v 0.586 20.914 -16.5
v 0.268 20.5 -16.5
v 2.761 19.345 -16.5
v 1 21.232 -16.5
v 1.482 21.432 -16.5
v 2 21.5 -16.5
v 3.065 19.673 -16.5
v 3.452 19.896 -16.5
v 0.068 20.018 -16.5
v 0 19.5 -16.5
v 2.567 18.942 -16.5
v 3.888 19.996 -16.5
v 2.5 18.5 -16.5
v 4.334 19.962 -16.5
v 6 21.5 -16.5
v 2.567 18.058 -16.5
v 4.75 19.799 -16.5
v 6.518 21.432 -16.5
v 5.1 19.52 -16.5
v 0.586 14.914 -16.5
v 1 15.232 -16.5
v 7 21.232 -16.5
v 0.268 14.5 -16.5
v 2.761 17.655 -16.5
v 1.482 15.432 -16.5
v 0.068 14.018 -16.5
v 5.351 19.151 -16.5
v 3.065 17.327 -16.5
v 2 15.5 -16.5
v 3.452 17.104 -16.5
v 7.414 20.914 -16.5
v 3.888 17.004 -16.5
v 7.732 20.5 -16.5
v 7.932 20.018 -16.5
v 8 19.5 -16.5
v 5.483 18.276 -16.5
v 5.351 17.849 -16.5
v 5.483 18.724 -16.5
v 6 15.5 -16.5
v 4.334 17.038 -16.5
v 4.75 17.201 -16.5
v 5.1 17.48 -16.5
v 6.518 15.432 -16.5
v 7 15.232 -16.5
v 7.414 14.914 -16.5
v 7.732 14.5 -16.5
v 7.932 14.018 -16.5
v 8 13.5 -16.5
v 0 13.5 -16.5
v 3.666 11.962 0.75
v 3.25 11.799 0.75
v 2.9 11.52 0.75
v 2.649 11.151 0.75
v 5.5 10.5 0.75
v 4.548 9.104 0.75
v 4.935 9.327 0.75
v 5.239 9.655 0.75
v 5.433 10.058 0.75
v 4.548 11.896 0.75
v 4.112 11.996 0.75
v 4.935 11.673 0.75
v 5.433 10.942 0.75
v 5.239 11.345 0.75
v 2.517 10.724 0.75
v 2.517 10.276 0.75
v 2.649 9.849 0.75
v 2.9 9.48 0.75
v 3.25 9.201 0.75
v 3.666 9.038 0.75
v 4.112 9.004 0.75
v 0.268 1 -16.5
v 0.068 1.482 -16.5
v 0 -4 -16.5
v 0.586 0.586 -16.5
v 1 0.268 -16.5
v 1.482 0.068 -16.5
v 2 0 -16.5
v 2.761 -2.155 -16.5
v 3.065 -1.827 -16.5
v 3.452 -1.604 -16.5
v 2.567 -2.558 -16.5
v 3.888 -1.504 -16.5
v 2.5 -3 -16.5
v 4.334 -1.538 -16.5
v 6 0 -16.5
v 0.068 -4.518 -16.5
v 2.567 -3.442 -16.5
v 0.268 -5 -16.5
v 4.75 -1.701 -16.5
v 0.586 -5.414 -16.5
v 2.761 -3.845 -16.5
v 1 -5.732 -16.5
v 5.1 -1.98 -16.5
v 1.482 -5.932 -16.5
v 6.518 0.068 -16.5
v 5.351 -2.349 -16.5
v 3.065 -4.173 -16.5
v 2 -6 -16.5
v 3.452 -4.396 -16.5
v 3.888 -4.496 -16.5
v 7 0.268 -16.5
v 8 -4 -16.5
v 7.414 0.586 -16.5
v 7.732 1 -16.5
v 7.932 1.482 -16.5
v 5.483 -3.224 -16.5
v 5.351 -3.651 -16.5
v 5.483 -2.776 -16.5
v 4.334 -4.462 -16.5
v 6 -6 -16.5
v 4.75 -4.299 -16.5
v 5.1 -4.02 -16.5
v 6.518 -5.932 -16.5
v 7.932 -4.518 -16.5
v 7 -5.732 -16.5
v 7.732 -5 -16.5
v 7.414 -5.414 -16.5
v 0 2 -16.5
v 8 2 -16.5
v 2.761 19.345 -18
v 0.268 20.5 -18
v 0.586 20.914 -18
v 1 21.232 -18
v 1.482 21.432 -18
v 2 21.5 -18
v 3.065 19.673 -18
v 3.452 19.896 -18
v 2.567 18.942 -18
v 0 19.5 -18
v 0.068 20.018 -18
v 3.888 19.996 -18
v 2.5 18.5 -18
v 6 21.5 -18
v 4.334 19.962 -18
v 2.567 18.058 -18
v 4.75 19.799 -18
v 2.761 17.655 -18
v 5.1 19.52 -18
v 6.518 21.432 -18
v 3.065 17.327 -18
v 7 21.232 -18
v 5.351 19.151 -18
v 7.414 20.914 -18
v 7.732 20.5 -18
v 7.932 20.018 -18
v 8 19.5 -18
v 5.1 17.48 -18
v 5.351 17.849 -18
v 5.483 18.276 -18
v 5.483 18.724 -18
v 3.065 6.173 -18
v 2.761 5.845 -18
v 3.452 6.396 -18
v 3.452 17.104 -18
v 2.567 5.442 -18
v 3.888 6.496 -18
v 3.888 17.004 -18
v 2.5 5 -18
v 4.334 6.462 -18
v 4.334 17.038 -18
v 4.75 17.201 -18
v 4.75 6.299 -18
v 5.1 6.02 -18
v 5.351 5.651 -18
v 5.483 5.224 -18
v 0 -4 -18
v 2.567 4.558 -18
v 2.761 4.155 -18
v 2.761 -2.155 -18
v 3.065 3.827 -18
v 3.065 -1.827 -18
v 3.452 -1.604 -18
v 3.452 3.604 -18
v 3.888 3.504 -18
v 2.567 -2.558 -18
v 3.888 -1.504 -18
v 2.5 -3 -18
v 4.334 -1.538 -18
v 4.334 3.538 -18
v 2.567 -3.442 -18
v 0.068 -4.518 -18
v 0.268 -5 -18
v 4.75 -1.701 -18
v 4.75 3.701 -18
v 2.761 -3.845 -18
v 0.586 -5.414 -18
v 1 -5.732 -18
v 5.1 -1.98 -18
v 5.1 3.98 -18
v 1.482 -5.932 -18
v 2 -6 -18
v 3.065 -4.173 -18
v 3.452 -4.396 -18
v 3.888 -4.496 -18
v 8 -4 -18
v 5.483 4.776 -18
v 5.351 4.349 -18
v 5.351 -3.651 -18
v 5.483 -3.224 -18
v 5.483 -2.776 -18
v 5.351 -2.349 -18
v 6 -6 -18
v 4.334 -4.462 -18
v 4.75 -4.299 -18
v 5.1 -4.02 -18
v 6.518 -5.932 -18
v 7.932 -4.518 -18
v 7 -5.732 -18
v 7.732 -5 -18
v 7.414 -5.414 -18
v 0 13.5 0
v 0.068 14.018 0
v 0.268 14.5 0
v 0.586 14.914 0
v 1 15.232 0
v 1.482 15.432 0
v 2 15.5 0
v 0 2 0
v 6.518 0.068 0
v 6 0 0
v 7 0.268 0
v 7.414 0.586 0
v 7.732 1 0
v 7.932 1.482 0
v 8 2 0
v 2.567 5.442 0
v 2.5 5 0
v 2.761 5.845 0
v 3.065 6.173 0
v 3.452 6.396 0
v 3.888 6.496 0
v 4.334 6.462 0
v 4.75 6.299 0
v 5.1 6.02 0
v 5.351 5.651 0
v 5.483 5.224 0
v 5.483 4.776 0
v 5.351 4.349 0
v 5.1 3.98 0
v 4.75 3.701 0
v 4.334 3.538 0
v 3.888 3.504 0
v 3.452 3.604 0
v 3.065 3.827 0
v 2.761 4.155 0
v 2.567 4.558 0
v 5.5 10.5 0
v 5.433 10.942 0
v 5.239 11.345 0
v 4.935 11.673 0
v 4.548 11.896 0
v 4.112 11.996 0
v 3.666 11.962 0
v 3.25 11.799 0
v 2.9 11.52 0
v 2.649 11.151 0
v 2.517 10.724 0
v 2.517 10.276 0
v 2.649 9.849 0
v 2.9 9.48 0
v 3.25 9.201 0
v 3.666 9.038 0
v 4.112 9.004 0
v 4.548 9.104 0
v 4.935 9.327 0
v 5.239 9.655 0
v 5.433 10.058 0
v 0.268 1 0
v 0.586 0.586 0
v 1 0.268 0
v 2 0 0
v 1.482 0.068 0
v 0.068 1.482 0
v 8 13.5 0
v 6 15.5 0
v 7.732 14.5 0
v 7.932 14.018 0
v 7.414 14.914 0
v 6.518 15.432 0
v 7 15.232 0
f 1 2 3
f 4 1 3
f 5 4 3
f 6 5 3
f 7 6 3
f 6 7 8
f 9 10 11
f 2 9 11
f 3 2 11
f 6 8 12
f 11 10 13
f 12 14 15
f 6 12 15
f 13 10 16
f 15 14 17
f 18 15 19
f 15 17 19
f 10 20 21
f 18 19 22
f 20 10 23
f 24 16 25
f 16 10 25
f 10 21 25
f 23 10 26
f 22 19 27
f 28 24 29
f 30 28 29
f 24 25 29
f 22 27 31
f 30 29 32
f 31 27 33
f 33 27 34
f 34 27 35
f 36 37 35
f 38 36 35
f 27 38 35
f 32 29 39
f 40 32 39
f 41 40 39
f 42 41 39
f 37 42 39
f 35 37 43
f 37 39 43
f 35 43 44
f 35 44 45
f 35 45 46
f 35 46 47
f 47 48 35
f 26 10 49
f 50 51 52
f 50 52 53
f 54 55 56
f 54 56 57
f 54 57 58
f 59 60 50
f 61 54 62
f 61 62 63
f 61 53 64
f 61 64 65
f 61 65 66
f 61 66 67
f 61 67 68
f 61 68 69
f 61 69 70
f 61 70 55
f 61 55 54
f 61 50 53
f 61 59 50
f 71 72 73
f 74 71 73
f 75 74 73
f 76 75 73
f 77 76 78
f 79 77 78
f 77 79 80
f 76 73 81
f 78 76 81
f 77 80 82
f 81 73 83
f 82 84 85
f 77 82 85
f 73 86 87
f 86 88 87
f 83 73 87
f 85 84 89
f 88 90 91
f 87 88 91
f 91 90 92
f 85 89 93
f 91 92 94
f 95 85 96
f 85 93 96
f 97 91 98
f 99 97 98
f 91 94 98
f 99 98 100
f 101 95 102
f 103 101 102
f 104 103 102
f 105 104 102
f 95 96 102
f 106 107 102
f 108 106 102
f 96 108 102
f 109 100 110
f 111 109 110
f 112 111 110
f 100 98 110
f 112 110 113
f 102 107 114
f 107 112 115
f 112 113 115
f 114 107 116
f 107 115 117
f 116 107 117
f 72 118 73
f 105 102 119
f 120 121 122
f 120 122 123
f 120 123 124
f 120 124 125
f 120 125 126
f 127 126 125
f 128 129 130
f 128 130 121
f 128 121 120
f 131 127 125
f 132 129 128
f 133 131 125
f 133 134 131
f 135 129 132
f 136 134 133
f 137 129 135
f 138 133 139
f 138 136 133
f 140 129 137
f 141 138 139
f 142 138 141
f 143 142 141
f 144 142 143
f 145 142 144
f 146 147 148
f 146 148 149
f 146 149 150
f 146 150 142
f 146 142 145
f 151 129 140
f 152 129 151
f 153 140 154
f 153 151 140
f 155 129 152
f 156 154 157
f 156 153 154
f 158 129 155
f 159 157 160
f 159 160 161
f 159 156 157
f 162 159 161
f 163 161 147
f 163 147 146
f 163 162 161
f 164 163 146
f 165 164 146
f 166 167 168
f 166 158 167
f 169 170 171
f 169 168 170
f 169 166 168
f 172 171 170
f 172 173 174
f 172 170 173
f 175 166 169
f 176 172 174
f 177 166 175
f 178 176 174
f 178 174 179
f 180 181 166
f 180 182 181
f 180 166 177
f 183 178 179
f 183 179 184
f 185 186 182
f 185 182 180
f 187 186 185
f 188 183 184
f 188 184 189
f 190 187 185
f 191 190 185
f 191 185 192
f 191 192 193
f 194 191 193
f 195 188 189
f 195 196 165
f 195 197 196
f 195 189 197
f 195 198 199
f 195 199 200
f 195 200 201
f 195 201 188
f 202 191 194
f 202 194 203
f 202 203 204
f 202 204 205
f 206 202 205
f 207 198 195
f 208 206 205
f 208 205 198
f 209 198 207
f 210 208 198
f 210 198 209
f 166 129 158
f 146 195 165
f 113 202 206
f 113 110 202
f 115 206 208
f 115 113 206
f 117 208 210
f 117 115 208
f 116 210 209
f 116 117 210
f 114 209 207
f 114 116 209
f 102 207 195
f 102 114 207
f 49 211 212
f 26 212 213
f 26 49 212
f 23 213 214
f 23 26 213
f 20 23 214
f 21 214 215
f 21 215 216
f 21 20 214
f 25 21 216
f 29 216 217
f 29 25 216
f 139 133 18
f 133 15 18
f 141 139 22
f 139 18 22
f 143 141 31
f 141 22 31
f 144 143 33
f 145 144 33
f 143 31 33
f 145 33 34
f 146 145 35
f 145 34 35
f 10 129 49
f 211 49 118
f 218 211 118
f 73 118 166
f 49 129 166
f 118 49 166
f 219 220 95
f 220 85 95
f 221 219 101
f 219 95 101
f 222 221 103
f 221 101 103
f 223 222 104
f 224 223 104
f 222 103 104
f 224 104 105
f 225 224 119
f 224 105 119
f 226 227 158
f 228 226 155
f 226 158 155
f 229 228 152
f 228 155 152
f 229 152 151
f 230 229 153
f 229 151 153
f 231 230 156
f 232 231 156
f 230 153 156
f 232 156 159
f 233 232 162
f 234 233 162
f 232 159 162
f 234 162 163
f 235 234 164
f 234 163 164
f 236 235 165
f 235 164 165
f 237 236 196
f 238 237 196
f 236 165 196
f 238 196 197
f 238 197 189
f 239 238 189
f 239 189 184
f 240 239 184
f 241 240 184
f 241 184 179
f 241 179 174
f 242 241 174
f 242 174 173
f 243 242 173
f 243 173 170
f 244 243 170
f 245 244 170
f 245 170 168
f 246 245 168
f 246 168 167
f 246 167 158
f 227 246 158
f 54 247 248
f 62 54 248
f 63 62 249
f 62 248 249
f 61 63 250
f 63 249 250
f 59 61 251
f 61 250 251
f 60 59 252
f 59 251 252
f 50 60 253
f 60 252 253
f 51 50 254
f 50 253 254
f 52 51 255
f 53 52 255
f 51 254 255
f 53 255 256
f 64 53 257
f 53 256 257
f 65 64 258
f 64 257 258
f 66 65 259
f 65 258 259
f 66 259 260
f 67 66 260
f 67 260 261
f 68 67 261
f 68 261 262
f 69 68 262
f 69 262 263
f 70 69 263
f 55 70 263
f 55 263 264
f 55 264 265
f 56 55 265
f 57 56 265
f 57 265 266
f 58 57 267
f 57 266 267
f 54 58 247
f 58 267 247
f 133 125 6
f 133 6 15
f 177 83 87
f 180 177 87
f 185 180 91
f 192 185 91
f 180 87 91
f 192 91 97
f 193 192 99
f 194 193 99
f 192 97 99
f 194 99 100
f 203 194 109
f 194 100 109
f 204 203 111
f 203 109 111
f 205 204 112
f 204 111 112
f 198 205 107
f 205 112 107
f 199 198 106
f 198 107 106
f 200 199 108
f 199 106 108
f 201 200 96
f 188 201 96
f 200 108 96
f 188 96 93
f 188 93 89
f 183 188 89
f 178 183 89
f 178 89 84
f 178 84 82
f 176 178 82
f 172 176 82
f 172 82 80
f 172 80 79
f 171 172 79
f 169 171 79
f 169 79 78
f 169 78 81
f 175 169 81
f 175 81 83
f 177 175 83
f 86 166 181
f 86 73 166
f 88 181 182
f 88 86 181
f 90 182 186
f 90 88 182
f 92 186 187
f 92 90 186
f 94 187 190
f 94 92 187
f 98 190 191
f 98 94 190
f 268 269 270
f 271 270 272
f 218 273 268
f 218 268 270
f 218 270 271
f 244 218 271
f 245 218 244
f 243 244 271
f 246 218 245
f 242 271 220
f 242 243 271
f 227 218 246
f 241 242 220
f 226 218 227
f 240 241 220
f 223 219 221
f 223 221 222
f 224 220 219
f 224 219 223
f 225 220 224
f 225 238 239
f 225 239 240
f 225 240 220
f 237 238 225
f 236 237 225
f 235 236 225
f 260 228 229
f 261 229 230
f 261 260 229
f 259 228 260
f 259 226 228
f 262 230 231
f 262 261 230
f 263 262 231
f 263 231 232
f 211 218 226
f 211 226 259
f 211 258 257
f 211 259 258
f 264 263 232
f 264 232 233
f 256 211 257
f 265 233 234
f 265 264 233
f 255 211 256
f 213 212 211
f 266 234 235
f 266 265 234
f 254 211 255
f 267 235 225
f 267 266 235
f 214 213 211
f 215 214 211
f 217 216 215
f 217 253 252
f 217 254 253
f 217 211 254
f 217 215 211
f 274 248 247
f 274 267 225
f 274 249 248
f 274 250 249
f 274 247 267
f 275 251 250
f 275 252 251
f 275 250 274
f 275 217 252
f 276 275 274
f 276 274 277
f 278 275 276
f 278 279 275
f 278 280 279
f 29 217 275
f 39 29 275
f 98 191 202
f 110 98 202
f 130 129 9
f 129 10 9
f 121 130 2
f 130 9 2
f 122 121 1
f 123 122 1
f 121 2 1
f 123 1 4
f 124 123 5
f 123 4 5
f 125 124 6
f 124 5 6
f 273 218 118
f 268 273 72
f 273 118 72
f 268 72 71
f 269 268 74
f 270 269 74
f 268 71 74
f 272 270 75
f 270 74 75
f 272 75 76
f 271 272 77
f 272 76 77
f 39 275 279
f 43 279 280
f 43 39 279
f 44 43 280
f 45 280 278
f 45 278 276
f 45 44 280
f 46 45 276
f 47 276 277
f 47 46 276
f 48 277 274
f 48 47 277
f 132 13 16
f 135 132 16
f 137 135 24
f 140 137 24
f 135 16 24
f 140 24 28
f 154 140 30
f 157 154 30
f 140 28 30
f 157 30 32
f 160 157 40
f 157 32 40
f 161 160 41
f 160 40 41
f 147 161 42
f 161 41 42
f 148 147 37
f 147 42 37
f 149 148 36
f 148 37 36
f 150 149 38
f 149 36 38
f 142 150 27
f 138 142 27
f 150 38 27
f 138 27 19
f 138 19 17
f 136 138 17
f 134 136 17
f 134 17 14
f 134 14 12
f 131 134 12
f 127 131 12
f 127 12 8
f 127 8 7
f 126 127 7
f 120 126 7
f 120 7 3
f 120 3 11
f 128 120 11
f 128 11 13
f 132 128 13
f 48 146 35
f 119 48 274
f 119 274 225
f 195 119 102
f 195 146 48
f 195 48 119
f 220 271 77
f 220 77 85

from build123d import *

# Parameters (mm, degrees)
F0_W     = 8
F0_H     = 15.5
F0_R     = 1.5
F1_DEPTH = 18
F2_D     = 3
F3_DEPTH = 0.75
F4_W     = 8
F4_H     = 6
F5_DEPTH = 1.5
F6_D     = 3
F7_R     = 2


with BuildPart() as f1:
    # F0 (on Top) → F1 (new body)
    with BuildSketch(Plane.XY):
        with Locations((4, 7.75)):
            Rectangle(F0_W, F0_H)
        with Locations((4, 10.5)):
            Circle(F0_R, mode=Mode.SUBTRACT)
        with Locations((4, 10.5)):
            Circle(F0_R)
    extrude(amount=-F1_DEPTH)

    # F2 (through all)
    with Locations(Plane.XY):
        with Locations((4, 5)):
            Hole(F2_D / 2)

    # F0 (on Top) → F3 (join)
    with BuildSketch(Plane.XY):
        with Locations((4, 10.5)):
            Circle(F0_R)
    extrude(amount=F3_DEPTH)

    # F4 (on face) → F5 (join)
    with BuildSketch(Plane(origin=(0, 0, -18), x_dir=(1, 0, 0), z_dir=(0, 0, -1))):
        with Locations((4, 3)):
            Rectangle(F4_W, F4_H)
        with Locations((4, -18.5)):
            Rectangle(F4_W, F4_H)
    extrude(amount=-F5_DEPTH)

    # F6 (through all)
    with Locations(Plane(origin=(0, 0, -18), x_dir=(1, 0, 0), z_dir=(0, 0, -1))):
        with Locations((4, 3), (4, -18.5)):
            Hole(F6_D / 2)

    # F7
    f7_edges = [f1.edges().sort_by_distance(p)[0] for p in [
        (0, 0, -8.25),
        (8, 0, -8.25),
        (8, 15.5, -8.25),
        (0, 15.5, -8.25),
        (8, -6, -17.25),
        (0, -6, -17.25),
        (8, 21.5, -17.25),
        (0, 21.5, -17.25),
    ]]
    fillet(f7_edges, radius=F7_R)


solid = f1.part
